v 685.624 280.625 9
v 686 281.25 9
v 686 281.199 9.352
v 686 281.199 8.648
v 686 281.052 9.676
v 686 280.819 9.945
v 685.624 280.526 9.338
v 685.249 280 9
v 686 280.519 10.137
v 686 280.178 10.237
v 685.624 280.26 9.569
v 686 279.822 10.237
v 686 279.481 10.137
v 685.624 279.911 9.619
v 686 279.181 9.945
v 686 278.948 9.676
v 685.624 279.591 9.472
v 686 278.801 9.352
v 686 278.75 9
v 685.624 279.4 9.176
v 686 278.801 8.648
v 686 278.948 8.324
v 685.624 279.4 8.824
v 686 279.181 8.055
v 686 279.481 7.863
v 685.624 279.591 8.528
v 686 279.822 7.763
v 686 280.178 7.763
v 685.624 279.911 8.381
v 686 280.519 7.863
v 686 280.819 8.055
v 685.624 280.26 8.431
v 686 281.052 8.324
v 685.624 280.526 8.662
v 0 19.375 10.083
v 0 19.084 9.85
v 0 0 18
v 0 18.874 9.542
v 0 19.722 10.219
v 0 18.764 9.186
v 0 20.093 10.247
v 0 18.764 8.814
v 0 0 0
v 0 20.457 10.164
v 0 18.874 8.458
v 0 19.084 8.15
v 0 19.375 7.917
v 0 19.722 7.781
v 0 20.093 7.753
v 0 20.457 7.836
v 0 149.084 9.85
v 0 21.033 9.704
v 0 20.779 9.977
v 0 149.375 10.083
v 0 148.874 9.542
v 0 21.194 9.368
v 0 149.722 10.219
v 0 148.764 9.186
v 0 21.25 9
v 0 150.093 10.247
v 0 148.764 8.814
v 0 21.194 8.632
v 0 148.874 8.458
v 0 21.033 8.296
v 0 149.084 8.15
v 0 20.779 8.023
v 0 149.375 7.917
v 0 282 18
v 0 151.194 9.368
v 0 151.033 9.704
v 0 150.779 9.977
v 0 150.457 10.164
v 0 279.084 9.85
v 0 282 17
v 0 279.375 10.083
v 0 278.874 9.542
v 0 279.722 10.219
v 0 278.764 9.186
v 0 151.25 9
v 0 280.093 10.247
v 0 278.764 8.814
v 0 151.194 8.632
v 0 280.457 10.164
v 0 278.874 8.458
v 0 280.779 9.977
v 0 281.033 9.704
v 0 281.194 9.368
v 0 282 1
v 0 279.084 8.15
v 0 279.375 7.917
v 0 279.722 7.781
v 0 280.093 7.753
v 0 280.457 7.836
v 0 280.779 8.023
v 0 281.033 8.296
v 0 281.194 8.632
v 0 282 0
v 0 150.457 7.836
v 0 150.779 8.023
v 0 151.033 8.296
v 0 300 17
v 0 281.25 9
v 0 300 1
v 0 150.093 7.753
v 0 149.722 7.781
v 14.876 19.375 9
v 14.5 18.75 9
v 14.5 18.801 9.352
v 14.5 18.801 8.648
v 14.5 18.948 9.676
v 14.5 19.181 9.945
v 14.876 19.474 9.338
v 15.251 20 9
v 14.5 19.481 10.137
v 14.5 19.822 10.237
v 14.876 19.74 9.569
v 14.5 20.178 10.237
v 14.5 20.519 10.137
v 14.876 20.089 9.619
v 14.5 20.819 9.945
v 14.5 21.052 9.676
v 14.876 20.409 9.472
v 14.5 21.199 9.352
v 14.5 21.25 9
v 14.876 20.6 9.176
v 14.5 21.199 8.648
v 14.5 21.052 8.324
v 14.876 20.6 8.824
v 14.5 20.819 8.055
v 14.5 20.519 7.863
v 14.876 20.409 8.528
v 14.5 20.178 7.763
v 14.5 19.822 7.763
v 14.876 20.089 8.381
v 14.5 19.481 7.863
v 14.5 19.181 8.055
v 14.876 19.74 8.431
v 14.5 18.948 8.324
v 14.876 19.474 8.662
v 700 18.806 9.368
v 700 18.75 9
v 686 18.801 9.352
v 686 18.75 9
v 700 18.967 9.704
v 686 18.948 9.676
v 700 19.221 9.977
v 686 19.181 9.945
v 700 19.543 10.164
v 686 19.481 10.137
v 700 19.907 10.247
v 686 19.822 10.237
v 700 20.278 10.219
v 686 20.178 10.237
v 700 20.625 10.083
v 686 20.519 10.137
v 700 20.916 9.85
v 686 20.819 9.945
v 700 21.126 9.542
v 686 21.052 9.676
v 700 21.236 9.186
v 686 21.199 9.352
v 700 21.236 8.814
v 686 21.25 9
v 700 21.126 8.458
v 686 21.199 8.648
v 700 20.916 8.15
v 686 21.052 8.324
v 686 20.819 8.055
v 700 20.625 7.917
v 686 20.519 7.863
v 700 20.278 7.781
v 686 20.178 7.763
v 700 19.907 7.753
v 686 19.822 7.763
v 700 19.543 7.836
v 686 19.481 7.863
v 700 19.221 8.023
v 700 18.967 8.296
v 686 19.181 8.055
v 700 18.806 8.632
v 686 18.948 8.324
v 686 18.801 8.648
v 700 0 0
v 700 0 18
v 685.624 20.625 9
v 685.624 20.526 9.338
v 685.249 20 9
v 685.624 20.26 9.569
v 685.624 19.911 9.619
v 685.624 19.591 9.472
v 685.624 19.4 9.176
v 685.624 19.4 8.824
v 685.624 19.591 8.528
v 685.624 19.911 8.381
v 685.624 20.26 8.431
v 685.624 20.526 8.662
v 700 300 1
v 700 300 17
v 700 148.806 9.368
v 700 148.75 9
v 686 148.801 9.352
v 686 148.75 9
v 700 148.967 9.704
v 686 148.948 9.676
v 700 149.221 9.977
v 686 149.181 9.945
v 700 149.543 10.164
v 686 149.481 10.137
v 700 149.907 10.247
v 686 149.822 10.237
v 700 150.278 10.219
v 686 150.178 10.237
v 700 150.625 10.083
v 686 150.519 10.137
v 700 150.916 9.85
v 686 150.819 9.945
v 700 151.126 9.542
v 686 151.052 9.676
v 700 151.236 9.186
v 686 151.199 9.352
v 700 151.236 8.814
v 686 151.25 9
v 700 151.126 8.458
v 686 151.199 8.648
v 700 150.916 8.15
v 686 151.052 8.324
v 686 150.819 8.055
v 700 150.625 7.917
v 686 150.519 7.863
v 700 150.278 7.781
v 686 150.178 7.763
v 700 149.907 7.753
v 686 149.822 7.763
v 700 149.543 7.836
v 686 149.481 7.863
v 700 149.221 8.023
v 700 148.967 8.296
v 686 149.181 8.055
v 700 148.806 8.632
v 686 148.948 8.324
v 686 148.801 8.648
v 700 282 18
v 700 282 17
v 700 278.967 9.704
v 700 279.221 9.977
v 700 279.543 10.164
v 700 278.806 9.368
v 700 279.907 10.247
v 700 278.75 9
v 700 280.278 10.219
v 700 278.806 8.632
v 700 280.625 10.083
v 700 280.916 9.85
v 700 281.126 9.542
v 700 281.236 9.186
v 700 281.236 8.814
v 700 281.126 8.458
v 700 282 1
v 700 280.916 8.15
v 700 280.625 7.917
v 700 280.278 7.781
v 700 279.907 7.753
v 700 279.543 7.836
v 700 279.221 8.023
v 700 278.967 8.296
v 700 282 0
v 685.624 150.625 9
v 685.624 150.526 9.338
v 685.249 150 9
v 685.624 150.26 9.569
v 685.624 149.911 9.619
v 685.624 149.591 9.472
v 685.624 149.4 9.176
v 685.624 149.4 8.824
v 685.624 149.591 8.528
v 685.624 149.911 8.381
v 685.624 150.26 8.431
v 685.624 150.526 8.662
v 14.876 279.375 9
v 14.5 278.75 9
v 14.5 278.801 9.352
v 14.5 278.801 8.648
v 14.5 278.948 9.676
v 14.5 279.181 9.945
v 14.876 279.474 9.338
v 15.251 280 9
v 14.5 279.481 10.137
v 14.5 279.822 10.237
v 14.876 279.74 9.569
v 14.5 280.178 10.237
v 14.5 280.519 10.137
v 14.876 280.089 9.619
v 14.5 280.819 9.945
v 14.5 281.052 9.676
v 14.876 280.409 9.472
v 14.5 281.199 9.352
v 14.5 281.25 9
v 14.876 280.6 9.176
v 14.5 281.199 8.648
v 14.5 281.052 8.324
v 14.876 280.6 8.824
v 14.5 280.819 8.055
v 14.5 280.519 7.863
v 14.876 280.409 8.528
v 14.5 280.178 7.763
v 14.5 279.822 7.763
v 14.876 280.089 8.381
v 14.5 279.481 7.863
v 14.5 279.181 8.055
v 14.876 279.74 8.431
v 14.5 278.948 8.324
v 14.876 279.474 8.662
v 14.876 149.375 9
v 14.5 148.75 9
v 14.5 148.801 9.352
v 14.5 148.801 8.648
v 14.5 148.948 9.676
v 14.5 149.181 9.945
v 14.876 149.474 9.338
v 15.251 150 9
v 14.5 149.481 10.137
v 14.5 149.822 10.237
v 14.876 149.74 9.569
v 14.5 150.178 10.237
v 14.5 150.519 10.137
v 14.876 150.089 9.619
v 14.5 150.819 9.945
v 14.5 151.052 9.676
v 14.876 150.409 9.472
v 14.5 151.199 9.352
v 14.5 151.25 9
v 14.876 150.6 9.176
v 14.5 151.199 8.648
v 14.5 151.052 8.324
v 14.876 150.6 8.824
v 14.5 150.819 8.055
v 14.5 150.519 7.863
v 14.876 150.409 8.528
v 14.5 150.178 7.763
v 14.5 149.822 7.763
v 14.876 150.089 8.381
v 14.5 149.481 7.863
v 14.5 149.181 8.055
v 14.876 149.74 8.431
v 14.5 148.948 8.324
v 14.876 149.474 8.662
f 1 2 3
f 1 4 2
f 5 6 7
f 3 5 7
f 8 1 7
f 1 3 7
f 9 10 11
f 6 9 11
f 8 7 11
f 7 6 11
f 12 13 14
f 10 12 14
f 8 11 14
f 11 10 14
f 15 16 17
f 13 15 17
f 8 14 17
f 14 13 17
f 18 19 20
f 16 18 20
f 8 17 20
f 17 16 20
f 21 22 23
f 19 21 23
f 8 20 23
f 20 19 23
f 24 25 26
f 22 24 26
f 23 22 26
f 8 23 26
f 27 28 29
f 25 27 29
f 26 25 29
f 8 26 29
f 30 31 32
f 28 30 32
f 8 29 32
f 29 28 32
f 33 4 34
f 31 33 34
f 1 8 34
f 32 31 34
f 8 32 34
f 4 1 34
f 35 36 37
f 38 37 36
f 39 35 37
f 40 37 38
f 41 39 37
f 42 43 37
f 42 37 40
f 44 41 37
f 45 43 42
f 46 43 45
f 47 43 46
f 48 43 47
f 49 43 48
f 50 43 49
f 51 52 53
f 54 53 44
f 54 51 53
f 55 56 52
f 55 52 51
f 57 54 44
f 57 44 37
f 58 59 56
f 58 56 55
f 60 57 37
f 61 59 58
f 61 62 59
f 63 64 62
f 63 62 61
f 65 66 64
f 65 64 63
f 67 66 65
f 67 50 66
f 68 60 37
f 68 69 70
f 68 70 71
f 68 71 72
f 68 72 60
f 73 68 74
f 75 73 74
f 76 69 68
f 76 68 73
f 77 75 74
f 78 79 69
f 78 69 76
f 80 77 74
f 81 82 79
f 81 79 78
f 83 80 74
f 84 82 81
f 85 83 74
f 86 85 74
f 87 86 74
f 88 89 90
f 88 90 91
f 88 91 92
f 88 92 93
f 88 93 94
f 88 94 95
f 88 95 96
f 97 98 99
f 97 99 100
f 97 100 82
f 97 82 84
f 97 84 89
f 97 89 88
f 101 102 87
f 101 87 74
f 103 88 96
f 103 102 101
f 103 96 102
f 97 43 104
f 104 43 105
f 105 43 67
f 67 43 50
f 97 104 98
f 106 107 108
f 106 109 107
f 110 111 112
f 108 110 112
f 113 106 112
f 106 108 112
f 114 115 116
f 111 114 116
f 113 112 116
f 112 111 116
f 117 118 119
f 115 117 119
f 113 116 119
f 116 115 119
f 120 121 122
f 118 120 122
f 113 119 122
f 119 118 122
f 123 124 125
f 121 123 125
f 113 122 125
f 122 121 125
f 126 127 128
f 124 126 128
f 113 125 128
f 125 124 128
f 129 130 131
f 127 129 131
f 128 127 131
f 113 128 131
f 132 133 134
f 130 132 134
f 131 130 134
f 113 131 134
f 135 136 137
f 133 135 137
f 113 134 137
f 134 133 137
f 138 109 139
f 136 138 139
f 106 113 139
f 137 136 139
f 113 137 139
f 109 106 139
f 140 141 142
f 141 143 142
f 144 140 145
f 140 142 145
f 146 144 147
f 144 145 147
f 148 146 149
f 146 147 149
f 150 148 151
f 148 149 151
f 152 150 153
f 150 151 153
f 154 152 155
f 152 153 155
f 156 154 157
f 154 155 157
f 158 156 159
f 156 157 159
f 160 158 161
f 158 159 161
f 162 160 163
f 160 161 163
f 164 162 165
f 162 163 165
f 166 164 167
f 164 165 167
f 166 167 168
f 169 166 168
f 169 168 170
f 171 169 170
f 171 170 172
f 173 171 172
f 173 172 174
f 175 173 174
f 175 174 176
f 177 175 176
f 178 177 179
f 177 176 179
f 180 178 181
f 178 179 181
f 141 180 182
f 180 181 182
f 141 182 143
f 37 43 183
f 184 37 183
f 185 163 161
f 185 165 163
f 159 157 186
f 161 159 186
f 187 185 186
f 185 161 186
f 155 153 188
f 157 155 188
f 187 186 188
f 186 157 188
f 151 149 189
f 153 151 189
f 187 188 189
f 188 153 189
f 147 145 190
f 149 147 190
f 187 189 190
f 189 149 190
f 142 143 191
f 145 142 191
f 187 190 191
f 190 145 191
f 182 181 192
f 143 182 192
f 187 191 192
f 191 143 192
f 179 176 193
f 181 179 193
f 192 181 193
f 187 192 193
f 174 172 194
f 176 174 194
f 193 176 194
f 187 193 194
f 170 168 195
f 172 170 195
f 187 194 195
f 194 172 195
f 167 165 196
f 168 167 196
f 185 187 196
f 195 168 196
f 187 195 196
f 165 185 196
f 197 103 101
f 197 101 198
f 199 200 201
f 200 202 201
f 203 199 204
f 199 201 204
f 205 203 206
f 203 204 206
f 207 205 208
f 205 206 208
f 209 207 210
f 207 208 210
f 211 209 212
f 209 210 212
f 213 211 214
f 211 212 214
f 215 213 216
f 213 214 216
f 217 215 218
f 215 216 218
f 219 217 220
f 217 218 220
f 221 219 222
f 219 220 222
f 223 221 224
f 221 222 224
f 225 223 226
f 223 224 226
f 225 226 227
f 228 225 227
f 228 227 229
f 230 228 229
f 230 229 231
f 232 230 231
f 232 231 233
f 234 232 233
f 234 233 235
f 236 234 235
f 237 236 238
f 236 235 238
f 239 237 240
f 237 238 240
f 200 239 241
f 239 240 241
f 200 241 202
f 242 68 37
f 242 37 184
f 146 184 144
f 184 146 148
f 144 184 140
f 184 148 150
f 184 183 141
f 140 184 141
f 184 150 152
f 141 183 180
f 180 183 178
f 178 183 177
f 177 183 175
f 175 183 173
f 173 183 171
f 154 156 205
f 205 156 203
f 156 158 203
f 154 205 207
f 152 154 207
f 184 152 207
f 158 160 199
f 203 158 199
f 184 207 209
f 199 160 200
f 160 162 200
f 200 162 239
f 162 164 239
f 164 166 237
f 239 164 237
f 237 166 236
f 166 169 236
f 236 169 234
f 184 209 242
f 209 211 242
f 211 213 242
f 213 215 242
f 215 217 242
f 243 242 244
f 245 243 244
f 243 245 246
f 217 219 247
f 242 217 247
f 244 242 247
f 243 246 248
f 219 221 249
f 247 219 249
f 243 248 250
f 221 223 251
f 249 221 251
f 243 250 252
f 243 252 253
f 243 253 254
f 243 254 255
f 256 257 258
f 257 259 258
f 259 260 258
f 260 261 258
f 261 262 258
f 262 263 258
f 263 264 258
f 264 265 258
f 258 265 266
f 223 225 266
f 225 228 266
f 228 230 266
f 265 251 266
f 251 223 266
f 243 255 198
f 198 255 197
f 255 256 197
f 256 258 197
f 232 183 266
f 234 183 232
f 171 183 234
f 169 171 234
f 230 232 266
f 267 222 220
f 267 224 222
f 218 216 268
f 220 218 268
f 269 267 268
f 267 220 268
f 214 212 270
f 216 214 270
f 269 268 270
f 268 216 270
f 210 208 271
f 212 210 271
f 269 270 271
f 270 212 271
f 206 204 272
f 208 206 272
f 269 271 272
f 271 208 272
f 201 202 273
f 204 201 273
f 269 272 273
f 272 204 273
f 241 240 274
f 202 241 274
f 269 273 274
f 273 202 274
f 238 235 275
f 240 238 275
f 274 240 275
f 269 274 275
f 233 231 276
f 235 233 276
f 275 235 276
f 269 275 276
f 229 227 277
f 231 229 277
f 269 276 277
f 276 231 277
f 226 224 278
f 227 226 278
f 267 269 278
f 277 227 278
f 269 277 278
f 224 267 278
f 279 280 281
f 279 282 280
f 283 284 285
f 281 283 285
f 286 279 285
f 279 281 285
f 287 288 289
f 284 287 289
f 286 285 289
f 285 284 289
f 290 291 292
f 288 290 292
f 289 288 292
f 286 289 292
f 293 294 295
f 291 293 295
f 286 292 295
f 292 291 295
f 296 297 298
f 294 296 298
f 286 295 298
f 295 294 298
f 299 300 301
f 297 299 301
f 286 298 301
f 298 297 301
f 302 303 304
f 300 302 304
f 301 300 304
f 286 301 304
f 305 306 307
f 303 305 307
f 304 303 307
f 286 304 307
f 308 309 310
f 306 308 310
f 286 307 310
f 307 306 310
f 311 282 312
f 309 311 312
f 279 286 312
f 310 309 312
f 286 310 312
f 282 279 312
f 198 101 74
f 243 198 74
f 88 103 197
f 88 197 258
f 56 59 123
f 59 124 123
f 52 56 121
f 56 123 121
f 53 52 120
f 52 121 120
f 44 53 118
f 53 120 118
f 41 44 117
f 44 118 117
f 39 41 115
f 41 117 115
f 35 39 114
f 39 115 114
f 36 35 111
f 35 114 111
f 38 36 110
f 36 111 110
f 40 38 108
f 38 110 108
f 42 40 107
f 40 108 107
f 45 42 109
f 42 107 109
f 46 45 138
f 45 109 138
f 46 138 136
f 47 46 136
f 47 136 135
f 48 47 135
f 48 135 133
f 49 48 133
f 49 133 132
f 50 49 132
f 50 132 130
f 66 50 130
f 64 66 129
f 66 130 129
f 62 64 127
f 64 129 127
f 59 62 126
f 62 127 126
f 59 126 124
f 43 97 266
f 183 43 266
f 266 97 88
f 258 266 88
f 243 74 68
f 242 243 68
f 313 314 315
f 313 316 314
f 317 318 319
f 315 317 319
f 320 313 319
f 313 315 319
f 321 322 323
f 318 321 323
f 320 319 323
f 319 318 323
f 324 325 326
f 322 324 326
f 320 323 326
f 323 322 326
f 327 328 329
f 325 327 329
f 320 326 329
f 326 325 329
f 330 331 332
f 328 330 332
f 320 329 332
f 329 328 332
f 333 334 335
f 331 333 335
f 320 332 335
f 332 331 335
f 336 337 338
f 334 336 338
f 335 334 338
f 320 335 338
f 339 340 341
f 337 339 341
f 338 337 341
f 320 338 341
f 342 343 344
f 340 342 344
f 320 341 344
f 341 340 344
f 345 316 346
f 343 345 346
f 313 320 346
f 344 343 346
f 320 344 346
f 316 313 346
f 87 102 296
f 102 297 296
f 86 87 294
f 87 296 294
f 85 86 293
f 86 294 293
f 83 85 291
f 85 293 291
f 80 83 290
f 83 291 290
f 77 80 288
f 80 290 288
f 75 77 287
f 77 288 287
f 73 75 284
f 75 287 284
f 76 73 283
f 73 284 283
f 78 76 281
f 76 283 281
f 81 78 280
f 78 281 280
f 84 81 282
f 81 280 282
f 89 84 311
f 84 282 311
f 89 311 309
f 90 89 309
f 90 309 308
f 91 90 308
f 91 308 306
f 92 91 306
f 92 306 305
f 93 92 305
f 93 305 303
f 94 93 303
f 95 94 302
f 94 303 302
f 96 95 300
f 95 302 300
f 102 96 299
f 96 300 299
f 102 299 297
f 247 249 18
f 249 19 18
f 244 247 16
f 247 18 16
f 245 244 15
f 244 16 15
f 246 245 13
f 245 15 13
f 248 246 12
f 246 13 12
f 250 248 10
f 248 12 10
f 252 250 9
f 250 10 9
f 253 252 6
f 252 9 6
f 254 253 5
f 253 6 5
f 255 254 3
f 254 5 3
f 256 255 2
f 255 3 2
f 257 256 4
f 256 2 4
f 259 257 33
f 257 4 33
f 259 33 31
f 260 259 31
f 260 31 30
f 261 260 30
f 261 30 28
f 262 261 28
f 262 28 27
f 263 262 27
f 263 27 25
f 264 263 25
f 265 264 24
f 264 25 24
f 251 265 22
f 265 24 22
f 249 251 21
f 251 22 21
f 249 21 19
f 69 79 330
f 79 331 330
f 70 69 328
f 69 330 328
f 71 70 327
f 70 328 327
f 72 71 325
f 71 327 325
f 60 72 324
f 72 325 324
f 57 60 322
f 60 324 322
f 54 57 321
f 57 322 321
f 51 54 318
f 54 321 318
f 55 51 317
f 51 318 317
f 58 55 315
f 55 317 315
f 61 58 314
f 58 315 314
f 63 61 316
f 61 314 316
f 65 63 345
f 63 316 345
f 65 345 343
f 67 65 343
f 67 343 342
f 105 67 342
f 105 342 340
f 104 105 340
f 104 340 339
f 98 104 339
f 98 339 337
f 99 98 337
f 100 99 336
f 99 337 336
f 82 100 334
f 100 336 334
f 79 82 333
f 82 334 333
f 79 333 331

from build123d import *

# Parameters (mm, degrees)
F0_W     = 700
F0_H     = 300
F1_DEPTH = 18
F2_W     = 18
F2_H     = 1
F3_DEPTH = 700.001
F5_D     = 2.5
F5_DEPTH = 14.5
F5_TIP   = 0.7510757738
F7_D     = 2.5
F7_DEPTH = 14
F7_TIP   = 0.7510757738


with BuildPart() as f1:
    # F0 (on Top) → F1 (new body)
    with BuildSketch(Plane.XY):
        with Locations((350, 150)):
            Rectangle(F0_W, F0_H)
    extrude(amount=F1_DEPTH)

    # F2 (on face) → F3 (cut, through all)
    with BuildSketch(Plane(origin=(0, 0, 0), x_dir=(0, -1, 0), z_dir=(-1, 0, 0))):
        with Locations((-291, 17.5)):
            Rectangle(F2_W, F2_H)
        with Locations((-291, 0.5)):
            Rectangle(F2_W, F2_H)
    extrude(amount=-F3_DEPTH, mode=Mode.SUBTRACT)

    # F5
    with Locations(Plane(origin=(0, 0, 0), x_dir=(0, -1, 0), z_dir=(-1, 0, 0))):
        with Locations((-280, 9), (-150, 9), (-20, 9)):
            Hole(F5_D / 2, depth=F5_DEPTH)
            with Locations((0, 0, -(F5_DEPTH + F5_TIP / 2))):  # 118° drill point
                Cone(0, F5_D / 2, F5_TIP, mode=Mode.SUBTRACT)

    # F7
    with Locations(Plane.YZ.offset(700)):
        with Locations((20, 9), (150, 9), (280, 9)):
            Hole(F7_D / 2, depth=F7_DEPTH)
            with Locations((0, 0, -(F7_DEPTH + F7_TIP / 2))):  # 118° drill point
                Cone(0, F7_D / 2, F7_TIP, mode=Mode.SUBTRACT)


solid = f1.part
